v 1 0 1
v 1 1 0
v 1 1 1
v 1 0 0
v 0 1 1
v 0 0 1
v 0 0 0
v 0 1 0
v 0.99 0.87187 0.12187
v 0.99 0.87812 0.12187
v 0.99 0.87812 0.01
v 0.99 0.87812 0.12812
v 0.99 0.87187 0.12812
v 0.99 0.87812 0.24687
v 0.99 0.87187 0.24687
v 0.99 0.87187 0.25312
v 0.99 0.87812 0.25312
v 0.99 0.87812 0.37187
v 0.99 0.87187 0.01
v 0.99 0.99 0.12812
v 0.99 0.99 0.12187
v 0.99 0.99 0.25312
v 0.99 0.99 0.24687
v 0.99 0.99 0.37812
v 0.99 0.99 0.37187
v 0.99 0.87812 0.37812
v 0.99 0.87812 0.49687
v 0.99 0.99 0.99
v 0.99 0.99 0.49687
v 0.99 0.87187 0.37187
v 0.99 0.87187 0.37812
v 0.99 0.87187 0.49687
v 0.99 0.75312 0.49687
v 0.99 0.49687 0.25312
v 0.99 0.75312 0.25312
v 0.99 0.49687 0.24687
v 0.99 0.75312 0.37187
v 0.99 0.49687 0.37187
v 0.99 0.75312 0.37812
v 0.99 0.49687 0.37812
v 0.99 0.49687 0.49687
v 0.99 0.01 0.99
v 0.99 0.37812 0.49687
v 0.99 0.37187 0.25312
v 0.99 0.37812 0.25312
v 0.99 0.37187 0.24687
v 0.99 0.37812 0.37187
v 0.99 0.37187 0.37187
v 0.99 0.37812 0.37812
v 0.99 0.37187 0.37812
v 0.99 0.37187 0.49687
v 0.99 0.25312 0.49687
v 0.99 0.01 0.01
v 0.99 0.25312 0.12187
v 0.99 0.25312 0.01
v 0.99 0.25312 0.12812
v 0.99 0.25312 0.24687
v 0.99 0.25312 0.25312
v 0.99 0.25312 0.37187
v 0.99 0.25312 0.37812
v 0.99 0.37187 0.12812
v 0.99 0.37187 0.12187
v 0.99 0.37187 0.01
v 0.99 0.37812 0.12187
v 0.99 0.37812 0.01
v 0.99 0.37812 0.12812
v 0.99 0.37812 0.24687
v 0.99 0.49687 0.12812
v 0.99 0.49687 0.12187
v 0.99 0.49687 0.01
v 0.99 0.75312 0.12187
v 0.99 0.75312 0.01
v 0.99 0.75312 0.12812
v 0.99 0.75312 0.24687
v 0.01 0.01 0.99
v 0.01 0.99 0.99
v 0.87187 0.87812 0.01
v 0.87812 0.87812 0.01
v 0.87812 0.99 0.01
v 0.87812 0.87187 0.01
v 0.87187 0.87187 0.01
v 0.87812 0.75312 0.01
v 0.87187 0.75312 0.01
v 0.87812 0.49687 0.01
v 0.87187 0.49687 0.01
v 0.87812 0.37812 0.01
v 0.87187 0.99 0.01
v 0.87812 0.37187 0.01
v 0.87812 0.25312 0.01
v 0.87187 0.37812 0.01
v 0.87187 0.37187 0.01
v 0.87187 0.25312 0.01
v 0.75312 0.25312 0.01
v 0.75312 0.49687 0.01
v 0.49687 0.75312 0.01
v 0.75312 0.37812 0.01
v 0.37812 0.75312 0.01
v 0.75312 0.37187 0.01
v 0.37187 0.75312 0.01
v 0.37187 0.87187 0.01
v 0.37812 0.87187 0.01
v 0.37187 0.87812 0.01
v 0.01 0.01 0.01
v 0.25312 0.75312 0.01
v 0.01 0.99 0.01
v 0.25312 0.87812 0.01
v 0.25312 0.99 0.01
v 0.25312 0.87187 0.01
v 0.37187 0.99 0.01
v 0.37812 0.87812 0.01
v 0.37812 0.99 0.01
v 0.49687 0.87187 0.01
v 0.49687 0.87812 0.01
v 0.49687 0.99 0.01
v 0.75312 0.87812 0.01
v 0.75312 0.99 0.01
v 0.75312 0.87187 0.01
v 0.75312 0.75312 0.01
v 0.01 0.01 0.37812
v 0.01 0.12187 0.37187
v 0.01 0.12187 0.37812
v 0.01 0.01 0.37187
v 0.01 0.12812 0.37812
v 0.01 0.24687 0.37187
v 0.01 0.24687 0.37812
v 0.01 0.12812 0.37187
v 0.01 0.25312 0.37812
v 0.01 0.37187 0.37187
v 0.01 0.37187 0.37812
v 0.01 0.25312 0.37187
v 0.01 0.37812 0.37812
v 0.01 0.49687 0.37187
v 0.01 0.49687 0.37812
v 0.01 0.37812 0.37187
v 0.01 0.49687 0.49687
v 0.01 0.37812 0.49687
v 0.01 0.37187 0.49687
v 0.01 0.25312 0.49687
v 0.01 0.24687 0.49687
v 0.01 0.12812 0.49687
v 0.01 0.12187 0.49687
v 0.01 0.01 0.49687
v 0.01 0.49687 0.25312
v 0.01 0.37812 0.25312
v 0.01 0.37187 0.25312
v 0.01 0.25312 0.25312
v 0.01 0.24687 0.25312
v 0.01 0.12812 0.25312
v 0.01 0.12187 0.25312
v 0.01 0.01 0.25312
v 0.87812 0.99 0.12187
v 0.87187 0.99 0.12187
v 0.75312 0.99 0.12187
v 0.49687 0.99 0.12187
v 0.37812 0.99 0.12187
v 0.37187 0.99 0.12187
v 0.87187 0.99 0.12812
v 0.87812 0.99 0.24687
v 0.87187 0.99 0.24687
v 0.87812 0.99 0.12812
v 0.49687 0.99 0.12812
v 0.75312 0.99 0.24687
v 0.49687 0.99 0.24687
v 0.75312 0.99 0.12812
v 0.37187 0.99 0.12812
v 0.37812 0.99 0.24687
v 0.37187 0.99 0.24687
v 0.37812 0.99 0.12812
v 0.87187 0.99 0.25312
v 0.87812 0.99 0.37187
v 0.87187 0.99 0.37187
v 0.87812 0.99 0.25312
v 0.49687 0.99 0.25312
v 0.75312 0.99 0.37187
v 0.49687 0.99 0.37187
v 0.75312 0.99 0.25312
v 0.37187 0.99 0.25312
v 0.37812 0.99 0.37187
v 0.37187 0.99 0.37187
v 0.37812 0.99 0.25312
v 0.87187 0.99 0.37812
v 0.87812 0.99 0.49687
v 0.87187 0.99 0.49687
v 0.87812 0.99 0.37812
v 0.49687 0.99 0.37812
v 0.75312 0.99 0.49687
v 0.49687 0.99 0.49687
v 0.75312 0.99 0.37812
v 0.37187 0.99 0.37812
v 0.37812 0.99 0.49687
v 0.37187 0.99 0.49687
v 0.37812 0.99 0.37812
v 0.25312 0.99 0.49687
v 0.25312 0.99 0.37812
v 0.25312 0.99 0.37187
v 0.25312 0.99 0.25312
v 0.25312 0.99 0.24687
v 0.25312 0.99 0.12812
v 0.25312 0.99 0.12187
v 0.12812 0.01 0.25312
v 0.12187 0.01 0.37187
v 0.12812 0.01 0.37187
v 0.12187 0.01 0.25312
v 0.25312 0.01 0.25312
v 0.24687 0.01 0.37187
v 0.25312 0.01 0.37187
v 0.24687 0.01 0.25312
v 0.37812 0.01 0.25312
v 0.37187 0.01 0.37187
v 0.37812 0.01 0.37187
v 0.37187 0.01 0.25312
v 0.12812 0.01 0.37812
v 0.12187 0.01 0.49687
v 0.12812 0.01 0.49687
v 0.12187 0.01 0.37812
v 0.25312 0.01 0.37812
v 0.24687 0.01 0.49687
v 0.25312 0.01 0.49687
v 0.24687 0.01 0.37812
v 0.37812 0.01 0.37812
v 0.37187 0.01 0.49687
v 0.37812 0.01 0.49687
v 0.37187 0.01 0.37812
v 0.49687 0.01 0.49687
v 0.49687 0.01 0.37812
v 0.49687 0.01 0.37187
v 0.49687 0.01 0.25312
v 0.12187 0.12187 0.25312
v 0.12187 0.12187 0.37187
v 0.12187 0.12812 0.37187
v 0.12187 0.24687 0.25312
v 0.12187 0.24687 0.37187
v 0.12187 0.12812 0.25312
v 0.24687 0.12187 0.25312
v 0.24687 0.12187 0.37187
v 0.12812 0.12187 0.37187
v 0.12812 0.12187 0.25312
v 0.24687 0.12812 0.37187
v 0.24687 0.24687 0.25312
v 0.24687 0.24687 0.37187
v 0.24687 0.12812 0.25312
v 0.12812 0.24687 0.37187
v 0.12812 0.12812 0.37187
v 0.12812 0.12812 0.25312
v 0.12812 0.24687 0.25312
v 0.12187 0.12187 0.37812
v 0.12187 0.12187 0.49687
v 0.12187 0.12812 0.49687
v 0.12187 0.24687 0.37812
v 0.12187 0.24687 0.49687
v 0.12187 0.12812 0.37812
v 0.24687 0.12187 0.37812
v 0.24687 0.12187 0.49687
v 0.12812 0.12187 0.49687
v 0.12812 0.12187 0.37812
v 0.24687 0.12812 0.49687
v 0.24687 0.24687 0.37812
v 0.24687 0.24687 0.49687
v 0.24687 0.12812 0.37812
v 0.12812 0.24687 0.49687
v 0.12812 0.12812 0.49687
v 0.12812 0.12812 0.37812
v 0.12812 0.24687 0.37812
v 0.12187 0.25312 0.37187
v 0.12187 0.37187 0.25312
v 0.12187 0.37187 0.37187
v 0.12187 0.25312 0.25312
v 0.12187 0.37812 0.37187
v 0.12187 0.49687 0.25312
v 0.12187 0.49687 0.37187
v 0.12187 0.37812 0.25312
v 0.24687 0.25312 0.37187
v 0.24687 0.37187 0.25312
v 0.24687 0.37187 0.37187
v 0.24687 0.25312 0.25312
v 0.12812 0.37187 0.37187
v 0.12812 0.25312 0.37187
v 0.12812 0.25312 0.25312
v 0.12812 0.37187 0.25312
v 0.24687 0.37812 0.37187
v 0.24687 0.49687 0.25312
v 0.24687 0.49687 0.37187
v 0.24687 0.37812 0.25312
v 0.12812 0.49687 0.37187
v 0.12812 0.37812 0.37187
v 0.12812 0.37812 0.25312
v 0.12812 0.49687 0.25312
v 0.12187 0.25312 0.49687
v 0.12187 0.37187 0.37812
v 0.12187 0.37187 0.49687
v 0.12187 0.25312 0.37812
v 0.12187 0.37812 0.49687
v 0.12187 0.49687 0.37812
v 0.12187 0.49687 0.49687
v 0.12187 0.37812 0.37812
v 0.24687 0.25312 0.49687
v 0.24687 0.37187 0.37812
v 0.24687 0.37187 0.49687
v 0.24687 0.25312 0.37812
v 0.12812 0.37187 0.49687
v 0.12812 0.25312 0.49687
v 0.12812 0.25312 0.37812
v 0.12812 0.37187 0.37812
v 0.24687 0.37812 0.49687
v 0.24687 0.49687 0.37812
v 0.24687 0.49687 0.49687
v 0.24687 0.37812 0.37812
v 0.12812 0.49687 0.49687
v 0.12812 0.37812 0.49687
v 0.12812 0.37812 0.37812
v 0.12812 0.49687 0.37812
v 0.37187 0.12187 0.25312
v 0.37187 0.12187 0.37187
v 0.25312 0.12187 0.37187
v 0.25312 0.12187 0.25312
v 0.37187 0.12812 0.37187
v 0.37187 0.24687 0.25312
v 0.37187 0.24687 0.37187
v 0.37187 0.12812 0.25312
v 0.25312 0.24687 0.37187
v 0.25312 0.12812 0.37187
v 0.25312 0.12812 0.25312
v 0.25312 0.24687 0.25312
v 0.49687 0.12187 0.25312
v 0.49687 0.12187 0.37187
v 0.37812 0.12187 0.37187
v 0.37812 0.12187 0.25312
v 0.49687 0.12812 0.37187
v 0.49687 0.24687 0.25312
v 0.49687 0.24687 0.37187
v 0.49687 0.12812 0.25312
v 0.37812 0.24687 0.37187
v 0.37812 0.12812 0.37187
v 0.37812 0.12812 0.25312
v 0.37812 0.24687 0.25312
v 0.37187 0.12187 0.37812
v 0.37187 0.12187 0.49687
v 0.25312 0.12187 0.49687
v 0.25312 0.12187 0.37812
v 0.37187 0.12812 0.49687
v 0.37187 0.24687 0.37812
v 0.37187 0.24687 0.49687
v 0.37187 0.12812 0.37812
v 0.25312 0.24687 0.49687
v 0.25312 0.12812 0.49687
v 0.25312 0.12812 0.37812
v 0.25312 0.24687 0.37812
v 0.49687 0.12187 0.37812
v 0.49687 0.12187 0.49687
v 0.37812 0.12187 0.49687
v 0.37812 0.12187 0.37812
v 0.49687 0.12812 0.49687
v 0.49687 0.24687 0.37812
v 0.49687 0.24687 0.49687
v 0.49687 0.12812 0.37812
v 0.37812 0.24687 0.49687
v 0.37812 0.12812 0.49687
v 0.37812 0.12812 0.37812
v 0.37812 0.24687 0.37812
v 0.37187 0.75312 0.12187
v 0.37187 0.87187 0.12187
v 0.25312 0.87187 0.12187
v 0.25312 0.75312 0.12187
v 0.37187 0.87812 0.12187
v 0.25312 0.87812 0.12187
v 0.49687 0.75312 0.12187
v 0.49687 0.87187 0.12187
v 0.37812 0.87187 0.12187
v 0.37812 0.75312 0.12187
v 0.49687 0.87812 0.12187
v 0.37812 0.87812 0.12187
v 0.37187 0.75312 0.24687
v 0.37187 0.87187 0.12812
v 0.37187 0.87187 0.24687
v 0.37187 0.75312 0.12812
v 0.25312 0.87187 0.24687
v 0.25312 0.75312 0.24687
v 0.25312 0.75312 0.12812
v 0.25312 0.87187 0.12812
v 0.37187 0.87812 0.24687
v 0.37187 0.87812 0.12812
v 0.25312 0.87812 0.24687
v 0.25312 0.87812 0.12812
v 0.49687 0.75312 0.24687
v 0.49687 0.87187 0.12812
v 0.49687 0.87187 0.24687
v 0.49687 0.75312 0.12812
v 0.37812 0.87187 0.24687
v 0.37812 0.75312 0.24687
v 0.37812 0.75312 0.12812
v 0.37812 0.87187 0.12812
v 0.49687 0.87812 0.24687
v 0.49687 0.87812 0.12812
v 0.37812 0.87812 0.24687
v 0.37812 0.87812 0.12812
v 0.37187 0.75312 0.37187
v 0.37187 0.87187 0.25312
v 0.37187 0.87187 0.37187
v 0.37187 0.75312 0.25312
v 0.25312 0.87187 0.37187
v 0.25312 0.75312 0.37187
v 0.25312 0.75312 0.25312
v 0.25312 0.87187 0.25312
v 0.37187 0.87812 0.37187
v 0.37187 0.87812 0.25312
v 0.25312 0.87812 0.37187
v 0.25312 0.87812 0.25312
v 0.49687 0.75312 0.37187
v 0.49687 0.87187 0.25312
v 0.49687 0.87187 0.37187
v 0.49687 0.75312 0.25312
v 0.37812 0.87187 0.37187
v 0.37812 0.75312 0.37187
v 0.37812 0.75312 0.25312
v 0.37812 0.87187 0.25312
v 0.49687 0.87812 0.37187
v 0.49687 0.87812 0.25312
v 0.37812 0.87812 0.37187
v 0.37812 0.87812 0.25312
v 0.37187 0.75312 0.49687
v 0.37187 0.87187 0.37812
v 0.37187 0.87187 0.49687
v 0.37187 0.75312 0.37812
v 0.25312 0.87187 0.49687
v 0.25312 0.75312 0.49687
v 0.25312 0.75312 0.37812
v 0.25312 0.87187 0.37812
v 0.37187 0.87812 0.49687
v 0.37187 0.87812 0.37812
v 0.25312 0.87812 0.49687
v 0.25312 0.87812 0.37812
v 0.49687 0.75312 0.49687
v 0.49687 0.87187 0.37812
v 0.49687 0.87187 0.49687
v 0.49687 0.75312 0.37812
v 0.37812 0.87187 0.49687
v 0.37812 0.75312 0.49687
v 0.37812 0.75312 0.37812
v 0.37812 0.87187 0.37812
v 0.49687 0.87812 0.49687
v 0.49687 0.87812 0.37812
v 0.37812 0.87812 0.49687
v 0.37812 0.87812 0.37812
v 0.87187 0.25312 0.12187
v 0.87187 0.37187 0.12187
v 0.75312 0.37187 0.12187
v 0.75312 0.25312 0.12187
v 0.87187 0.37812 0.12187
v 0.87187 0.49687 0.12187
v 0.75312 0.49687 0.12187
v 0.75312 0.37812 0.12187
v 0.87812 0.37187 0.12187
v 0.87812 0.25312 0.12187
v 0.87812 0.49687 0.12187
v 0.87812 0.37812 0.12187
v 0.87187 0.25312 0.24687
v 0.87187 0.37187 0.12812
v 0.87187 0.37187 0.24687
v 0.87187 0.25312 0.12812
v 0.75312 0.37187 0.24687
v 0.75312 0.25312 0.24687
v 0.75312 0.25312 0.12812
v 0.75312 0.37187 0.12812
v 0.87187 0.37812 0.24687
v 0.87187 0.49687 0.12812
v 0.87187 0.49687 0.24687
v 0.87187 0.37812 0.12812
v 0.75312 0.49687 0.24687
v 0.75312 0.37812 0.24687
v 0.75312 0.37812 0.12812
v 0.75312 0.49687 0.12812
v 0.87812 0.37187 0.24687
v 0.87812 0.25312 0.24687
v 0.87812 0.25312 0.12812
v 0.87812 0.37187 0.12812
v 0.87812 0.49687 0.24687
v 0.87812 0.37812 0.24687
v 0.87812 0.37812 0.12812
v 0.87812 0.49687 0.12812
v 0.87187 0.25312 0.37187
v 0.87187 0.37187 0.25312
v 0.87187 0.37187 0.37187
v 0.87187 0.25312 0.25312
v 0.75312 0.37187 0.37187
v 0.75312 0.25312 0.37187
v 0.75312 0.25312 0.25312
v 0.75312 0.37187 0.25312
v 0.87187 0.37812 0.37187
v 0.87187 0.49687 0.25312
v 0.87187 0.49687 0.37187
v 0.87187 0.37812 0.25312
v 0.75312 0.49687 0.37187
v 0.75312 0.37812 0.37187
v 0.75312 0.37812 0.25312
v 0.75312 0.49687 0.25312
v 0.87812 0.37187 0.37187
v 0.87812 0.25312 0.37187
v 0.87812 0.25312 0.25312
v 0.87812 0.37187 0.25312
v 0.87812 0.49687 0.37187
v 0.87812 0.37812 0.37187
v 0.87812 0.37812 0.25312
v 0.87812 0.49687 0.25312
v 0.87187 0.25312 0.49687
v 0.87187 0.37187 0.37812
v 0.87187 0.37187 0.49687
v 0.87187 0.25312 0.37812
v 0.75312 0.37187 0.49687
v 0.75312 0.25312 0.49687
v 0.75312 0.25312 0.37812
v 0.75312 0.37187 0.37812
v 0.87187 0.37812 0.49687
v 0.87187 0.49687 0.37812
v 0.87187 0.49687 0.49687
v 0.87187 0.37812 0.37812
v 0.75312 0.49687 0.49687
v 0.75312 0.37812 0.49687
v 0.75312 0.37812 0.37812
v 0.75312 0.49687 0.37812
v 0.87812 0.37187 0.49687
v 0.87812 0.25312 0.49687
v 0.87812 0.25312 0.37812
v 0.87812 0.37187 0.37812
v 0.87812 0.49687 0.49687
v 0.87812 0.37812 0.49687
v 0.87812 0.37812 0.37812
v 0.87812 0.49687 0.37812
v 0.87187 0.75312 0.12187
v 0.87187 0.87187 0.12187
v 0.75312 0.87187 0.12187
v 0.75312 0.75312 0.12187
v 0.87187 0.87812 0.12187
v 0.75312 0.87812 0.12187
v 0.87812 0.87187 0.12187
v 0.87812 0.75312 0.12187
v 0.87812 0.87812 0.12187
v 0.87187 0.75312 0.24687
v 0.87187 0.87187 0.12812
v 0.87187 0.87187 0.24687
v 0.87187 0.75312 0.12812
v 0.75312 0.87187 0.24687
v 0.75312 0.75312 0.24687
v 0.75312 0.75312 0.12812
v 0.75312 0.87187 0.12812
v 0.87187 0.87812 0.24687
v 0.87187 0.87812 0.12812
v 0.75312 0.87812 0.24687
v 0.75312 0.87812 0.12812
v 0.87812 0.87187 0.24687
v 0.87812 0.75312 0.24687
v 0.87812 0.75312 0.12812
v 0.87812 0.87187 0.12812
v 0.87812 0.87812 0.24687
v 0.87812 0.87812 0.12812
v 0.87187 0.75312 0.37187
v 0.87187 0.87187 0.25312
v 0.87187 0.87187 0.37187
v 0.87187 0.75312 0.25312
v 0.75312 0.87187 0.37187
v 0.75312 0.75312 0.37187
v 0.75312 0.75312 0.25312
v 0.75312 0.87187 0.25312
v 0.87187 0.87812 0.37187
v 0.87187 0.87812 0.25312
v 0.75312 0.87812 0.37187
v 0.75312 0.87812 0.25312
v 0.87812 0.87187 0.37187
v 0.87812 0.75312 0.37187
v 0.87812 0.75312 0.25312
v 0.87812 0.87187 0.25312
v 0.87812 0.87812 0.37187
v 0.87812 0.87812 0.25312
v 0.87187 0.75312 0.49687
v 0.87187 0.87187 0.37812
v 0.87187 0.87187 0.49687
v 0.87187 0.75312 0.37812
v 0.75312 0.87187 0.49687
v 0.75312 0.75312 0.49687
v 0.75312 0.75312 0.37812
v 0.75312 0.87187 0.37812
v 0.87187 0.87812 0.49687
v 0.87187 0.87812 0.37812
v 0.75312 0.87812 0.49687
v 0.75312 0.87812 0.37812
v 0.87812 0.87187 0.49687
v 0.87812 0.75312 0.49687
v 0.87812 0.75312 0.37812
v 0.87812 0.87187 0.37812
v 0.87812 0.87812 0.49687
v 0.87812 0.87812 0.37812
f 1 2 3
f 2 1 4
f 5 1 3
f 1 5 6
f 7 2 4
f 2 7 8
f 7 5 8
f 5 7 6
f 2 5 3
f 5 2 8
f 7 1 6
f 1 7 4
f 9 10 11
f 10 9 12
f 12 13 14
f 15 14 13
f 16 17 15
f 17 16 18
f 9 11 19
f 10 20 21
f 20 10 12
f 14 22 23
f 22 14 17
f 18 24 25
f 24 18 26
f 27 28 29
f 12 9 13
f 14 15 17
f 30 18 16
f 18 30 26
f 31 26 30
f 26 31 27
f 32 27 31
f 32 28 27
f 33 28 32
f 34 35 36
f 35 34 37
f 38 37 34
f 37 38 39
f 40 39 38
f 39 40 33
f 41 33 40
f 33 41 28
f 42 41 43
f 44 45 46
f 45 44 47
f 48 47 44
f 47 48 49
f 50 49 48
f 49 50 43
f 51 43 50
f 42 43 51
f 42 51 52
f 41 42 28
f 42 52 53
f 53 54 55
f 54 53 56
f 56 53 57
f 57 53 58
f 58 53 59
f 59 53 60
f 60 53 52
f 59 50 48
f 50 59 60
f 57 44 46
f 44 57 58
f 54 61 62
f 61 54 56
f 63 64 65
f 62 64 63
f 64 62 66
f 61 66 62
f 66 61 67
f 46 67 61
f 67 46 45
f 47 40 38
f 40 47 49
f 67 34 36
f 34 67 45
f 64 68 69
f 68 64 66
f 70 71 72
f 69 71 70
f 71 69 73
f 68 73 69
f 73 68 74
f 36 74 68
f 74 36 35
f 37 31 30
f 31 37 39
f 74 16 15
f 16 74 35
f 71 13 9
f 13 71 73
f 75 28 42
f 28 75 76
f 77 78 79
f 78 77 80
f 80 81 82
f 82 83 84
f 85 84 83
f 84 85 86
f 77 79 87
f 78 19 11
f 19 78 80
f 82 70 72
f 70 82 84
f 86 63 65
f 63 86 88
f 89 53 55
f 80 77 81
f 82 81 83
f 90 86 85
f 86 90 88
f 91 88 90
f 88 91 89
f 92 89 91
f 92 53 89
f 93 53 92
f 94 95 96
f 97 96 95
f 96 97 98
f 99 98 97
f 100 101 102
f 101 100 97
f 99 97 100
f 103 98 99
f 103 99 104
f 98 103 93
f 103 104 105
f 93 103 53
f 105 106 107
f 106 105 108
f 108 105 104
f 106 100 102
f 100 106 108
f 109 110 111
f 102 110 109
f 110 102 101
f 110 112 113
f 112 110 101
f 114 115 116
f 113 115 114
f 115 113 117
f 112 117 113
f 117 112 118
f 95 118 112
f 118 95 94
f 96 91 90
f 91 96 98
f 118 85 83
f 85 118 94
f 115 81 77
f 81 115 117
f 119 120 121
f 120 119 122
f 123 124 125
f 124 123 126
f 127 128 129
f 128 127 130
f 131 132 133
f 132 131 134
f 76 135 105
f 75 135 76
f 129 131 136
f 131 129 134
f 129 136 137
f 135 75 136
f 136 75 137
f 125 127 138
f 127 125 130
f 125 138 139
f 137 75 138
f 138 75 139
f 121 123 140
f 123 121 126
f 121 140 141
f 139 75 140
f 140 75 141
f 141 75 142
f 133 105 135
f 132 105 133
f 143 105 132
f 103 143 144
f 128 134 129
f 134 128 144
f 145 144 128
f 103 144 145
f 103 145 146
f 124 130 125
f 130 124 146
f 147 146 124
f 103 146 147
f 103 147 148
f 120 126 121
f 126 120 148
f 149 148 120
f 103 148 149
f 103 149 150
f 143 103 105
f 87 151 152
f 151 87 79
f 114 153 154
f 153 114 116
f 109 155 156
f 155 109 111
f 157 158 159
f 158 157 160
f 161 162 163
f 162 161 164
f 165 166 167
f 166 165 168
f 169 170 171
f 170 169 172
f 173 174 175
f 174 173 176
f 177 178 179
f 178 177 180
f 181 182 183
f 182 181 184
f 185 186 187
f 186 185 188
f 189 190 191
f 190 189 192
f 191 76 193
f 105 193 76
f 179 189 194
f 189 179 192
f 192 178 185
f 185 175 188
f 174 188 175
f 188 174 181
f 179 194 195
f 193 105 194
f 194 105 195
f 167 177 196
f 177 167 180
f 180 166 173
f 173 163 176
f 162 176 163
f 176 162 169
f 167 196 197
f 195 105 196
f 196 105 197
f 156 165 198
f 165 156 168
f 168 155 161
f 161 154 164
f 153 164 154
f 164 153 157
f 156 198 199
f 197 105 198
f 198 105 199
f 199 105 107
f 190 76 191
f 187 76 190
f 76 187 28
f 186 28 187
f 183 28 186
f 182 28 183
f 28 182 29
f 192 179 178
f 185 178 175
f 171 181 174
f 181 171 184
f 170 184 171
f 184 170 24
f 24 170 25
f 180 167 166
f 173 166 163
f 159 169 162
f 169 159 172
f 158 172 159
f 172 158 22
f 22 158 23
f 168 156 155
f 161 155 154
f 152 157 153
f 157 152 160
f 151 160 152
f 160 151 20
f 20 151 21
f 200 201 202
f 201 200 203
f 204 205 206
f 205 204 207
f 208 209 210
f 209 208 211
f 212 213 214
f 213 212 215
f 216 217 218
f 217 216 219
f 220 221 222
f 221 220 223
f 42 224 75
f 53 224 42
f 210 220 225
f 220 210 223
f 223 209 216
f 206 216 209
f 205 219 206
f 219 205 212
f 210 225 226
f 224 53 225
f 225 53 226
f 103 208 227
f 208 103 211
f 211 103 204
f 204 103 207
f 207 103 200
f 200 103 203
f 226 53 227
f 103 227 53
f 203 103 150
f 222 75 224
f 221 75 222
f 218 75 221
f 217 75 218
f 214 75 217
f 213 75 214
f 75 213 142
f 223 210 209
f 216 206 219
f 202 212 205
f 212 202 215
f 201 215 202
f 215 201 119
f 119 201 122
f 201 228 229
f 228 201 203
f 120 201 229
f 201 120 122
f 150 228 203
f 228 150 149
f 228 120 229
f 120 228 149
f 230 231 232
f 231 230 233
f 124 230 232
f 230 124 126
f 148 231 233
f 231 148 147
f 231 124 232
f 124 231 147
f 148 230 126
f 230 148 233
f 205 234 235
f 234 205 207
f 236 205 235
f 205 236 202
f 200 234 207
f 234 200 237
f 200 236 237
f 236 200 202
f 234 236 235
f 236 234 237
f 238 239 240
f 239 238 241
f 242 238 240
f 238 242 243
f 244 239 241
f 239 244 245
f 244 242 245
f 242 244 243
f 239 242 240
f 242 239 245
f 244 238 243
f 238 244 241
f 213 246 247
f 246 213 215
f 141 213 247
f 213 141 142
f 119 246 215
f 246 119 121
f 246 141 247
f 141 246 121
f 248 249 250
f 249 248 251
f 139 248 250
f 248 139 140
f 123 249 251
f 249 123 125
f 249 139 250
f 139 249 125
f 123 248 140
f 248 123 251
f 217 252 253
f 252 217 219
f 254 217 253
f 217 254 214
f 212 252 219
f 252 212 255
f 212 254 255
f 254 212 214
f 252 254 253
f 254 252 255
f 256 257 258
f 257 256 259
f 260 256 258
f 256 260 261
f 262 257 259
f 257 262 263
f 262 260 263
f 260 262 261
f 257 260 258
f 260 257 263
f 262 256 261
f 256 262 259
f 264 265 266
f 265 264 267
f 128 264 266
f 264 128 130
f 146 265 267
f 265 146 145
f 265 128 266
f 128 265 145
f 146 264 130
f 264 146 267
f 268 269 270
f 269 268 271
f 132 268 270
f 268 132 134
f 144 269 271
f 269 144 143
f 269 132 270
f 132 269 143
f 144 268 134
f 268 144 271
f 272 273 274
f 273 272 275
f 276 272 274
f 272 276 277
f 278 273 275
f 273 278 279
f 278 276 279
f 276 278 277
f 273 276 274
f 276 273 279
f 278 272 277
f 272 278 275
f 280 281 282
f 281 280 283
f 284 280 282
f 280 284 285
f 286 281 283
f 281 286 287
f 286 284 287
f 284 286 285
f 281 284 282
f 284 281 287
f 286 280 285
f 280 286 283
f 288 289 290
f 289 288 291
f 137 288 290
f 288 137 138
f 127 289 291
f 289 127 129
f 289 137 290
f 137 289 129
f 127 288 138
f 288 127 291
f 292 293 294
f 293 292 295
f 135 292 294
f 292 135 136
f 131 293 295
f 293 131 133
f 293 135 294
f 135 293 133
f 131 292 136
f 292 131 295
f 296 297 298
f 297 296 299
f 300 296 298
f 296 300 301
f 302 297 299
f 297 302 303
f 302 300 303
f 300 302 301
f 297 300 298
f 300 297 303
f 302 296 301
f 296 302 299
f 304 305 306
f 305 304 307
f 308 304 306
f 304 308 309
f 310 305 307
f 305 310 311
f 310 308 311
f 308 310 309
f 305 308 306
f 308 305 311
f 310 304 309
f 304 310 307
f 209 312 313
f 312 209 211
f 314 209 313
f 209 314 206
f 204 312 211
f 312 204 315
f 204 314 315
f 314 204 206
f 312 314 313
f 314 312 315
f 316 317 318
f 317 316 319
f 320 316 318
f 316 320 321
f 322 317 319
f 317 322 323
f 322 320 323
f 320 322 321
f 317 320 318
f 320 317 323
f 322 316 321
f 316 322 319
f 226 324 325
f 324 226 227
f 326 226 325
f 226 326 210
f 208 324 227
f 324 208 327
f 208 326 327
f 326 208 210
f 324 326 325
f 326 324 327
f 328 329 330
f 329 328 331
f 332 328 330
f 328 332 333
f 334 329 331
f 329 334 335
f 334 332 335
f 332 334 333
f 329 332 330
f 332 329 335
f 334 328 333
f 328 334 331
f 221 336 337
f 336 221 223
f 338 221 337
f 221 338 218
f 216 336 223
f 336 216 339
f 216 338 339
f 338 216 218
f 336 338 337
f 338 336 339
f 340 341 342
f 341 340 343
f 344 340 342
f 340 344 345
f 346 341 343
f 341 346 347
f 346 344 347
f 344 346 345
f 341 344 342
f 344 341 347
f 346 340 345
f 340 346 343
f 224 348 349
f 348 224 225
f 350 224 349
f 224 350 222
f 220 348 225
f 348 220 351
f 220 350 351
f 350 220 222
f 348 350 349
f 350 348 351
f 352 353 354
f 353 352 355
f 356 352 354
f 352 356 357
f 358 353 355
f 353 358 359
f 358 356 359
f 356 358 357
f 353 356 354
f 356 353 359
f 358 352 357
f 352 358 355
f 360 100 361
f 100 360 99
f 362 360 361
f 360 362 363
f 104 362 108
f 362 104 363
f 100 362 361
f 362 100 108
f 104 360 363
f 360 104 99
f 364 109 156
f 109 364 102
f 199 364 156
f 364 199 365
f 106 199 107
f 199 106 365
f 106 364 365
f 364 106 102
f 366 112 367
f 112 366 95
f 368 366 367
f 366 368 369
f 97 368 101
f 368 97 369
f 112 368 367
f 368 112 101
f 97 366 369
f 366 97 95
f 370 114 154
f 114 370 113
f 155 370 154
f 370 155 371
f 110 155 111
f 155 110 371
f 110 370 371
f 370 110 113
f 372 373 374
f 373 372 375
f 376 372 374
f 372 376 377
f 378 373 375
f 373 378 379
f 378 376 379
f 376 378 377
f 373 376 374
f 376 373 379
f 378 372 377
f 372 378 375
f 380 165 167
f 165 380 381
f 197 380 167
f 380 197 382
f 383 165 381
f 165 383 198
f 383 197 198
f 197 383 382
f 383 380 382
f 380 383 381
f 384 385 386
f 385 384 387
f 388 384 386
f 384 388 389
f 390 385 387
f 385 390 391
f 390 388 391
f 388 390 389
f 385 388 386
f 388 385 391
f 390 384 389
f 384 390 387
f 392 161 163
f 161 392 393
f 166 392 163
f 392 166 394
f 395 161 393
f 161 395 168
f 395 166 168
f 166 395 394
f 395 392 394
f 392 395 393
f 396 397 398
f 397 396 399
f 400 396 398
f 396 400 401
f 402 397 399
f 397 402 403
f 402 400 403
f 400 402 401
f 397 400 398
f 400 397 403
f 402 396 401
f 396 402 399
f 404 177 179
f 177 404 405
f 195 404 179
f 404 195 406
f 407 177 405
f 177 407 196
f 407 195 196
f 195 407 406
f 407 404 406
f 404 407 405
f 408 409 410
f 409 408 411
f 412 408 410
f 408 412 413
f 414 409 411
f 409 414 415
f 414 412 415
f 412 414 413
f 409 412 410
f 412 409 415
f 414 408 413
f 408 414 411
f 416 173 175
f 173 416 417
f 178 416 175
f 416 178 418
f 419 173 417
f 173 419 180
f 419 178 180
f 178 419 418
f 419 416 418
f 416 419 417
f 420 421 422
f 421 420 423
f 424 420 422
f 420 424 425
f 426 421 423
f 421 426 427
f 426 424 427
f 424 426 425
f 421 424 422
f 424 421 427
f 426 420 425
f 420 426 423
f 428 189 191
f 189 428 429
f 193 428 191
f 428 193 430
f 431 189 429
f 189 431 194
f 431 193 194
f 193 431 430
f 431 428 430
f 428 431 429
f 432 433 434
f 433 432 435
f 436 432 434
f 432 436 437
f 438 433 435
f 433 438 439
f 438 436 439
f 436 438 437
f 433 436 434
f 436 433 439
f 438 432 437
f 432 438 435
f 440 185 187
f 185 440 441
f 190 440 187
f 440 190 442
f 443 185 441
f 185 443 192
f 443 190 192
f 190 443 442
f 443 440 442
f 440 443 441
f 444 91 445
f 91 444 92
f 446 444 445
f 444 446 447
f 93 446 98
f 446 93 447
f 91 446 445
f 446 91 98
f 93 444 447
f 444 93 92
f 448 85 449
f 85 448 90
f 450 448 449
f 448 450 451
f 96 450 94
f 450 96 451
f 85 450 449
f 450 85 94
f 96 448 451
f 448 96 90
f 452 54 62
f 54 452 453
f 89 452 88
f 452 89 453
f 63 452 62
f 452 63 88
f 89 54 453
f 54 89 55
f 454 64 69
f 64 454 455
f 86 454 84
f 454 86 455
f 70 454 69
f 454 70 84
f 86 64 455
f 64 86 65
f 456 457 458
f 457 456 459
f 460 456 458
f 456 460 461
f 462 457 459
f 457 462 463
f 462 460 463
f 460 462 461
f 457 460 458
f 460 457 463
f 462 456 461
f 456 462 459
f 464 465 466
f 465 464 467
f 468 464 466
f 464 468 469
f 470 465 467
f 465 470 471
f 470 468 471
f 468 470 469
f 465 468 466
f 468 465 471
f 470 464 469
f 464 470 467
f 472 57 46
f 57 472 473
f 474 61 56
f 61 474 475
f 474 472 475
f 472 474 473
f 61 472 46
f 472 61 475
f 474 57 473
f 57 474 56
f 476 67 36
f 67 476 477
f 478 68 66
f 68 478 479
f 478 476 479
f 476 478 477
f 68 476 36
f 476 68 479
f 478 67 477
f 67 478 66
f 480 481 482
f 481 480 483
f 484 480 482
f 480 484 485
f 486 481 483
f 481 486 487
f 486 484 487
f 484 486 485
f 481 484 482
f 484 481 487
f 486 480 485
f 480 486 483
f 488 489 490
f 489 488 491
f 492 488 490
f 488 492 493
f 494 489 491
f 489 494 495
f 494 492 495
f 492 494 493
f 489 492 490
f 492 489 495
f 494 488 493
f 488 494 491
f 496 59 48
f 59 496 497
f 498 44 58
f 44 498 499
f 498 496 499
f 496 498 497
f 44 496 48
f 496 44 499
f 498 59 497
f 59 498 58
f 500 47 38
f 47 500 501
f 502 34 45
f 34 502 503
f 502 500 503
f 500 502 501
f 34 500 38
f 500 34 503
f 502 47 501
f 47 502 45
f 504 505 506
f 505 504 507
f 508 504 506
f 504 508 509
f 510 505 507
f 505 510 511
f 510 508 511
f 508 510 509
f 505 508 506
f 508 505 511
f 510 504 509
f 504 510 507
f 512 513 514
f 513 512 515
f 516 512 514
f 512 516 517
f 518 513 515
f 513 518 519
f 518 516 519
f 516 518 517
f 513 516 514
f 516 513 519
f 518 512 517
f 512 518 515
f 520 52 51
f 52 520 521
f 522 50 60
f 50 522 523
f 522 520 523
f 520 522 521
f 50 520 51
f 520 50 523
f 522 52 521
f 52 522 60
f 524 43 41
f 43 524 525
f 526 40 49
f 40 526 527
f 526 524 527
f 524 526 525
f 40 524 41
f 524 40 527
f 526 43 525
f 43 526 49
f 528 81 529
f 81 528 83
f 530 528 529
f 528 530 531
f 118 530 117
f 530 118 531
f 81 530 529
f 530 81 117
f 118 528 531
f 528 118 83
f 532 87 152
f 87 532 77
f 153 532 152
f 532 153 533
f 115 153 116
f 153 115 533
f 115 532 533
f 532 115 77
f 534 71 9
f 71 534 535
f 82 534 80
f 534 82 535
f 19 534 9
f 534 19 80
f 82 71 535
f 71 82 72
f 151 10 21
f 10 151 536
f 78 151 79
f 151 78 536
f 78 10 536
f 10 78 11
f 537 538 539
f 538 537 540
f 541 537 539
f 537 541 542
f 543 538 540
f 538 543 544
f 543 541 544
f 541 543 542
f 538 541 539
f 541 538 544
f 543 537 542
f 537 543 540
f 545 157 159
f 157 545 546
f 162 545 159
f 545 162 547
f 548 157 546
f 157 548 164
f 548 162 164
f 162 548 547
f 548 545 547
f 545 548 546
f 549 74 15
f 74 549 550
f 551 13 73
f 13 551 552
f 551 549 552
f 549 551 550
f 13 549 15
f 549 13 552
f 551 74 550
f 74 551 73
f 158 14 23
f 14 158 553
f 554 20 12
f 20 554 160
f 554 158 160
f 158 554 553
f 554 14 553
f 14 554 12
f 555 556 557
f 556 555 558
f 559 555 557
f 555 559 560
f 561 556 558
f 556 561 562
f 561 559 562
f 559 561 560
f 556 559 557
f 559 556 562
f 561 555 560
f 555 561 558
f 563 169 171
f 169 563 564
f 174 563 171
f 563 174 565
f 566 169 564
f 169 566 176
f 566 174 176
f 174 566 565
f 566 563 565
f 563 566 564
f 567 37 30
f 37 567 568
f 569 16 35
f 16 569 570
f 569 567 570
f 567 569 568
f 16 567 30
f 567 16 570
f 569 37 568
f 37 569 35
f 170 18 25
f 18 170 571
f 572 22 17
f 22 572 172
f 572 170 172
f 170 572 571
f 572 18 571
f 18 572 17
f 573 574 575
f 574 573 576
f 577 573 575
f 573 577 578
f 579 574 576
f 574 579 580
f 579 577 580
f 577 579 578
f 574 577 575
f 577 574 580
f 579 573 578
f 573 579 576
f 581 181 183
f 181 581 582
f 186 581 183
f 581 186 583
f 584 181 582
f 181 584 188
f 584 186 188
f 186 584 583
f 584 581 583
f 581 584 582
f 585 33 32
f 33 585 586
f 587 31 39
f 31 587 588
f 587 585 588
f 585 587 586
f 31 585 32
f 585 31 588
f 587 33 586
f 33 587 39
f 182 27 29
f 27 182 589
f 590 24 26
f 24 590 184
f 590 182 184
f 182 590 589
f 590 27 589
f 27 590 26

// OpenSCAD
translate([0.0625, 0.0625, 0.3125]) color([0.5841695812453656, 0.1964595669637591, 0.008074763612493485]) cube([0.11875, 0.11875, 0.11875], center=true);
translate([0.0625, 0.1875, 0.3125]) color([0.9494793193265006, 0.6241348693018607, 0.9875713538124239]) cube([0.11875, 0.11875, 0.11875], center=true);
translate([0.1875, 0.0625, 0.3125]) color([0.25082286371009, 0.8914996330245484, 0.1488376514269667]) cube([0.11875, 0.11875, 0.11875], center=true);
translate([0.1875, 0.1875, 0.3125]) color([0.27174126702940415, 0.7780062180869719, 0.10840893732786527]) cube([0.11875, 0.11875, 0.11875], center=true);
translate([0.0625, 0.0625, 0.4375]) color([0.492935634178017, 0.9925025742459079, 0.4763742033349181]) cube([0.11875, 0.11875, 0.11875], center=true);
translate([0.0625, 0.1875, 0.4375]) color([0.5645353940464544, 0.5645149416671972, 0.5782095790017063]) cube([0.11875, 0.11875, 0.11875], center=true);
translate([0.1875, 0.0625, 0.4375]) color([0.6259208181141003, 0.3183347846489948, 0.008894474561215282]) cube([0.11875, 0.11875, 0.11875], center=true);
translate([0.1875, 0.1875, 0.4375]) color([0.18153781425127913, 0.34637837294987994, 0.4332209949859577]) cube([0.11875, 0.11875, 0.11875], center=true);
translate([0.0625, 0.3125, 0.3125]) color([0.622677078771968, 0.460137332113394, 0.7269997238917864]) cube([0.11875, 0.11875, 0.11875], center=true);
translate([0.0625, 0.4375, 0.3125]) color([0.4327048094315018, 0.22311727903273915, 0.1897727920191702]) cube([0.11875, 0.11875, 0.11875], center=true);
translate([0.1875, 0.3125, 0.3125]) color([0.3552161035541822, 0.8963480118349955, 0.8220560222783454]) cube([0.11875, 0.11875, 0.11875], center=true);
translate([0.1875, 0.4375, 0.3125]) color([0.669948185257765, 0.358889329750682, 0.7679542096123538]) cube([0.11875, 0.11875, 0.11875], center=true);
translate([0.0625, 0.3125, 0.4375]) color([0.8826141592721374, 0.17940760591248683, 0.3538262276809083]) cube([0.11875, 0.11875, 0.11875], center=true);
translate([0.0625, 0.4375, 0.4375]) color([0.7932719249905827, 0.4788790393271024, 0.07989050421154975]) cube([0.11875, 0.11875, 0.11875], center=true);
translate([0.1875, 0.3125, 0.4375]) color([0.2300352112368863, 0.6572505439496785, 0.05068332689649402]) cube([0.11875, 0.11875, 0.11875], center=true);
translate([0.1875, 0.4375, 0.4375]) color([0.7936196601725969, 0.404241923497329, 0.462328648221512]) cube([0.11875, 0.11875, 0.11875], center=true);
translate([0.3125, 0.0625, 0.3125]) color([0.31878762038885544, 0.8255572067625851, 0.2007024141421666]) cube([0.11875, 0.11875, 0.11875], center=true);
translate([0.3125, 0.1875, 0.3125]) color([0.15132678193974147, 0.024979494971208438, 0.7729677973813559]) cube([0.11875, 0.11875, 0.11875], center=true);
translate([0.4375, 0.0625, 0.3125]) color([0.7722304331836956, 0.30532980306575985, 0.9493109840811514]) cube([0.11875, 0.11875, 0.11875], center=true);
translate([0.4375, 0.1875, 0.3125]) color([0.03532969454668722, 0.7465045555676156, 0.24592106518099655]) cube([0.11875, 0.11875, 0.11875], center=true);
translate([0.3125, 0.0625, 0.4375]) color([0.8991758354896038, 0.39552542168416527, 0.984654660668697]) cube([0.11875, 0.11875, 0.11875], center=true);
translate([0.3125, 0.1875, 0.4375]) color([0.608251397905789, 0.12712748175104782, 0.08747171410699894]) cube([0.11875, 0.11875, 0.11875], center=true);
translate([0.4375, 0.0625, 0.4375]) color([0.3808033765783264, 0.9240222660208113, 0.6648335234074098]) cube([0.11875, 0.11875, 0.11875], center=true);
translate([0.4375, 0.1875, 0.4375]) color([0.7060281207150522, 0.234661547137744, 0.7197367316041385]) cube([0.11875, 0.11875, 0.11875], center=true);
translate([0.3125, 0.8125, 0.0625]) color([0.4285424088939368, 0.29023292885267815, 0.7078102407181187]) cube([0.11875, 0.11875, 0.11875], center=true);
translate([0.3125, 0.9375, 0.0625]) color([0.5632558203134793, 0.3138573790894954, 0.7052161309992366]) cube([0.11875, 0.11875, 0.11875], center=true);
translate([0.4375, 0.8125, 0.0625]) color([0.32091493446133057, 0.293831403284706, 0.3731581655903512]) cube([0.11875, 0.11875, 0.11875], center=true);
translate([0.4375, 0.9375, 0.0625]) color([0.5782490675510084, 0.9927079095395339, 0.6332250780204816]) cube([0.11875, 0.11875, 0.11875], center=true);
translate([0.3125, 0.8125, 0.1875]) color([0.9262292011877322, 0.19257347229843758, 0.4847635825634379]) cube([0.11875, 0.11875, 0.11875], center=true);
translate([0.3125, 0.9375, 0.1875]) color([0.32293102426480036, 0.5648580026802762, 0.859039434316357]) cube([0.11875, 0.11875, 0.11875], center=true);
translate([0.4375, 0.8125, 0.1875]) color([0.11450467107224227, 0.24654270916573473, 0.8022431497195334]) cube([0.11875, 0.11875, 0.11875], center=true);
translate([0.4375, 0.9375, 0.1875]) color([0.9974782652977877, 0.5622891778919303, 0.8856148225541055]) cube([0.11875, 0.11875, 0.11875], center=true);
translate([0.3125, 0.8125, 0.3125]) color([0.0017464625305061432, 0.6399397853695268, 0.915867298849852]) cube([0.11875, 0.11875, 0.11875], center=true);
translate([0.3125, 0.9375, 0.3125]) color([0.5855424315707215, 0.38937260419771846, 0.8394811889125335]) cube([0.11875, 0.11875, 0.11875], center=true);
translate([0.4375, 0.8125, 0.3125]) color([0.3215048835753035, 0.3677562078169012, 0.7494627671301212]) cube([0.11875, 0.11875, 0.11875], center=true);
translate([0.4375, 0.9375, 0.3125]) color([0.30184863277022156, 0.6628736677885209, 0.0632131705894865]) cube([0.11875, 0.11875, 0.11875], center=true);
translate([0.3125, 0.8125, 0.4375]) color([0.5243842101287214, 0.47165497896075304, 0.9213736994711477]) cube([0.11875, 0.11875, 0.11875], center=true);
translate([0.3125, 0.9375, 0.4375]) color([0.2655300292692059, 0.05877022229080964, 0.8936048465596106]) cube([0.11875, 0.11875, 0.11875], center=true);
translate([0.4375, 0.8125, 0.4375]) color([0.38385546117475144, 0.5823938546186237, 0.8293811547972308]) cube([0.11875, 0.11875, 0.11875], center=true);
translate([0.4375, 0.9375, 0.4375]) color([0.48542924275687616, 0.10381936707984529, 0.5930381713407349]) cube([0.11875, 0.11875, 0.11875], center=true);
translate([0.8125, 0.3125, 0.0625]) color([0.8734760232510536, 0.1915382263628701, 0.38556480032929374]) cube([0.11875, 0.11875, 0.11875], center=true);
translate([0.8125, 0.4375, 0.0625]) color([0.017673348579883674, 0.8123534260898997, 0.15172321274214484]) cube([0.11875, 0.11875, 0.11875], center=true);
translate([0.9375, 0.3125, 0.0625]) color([0.41808413487617535, 0.6347834890460891, 0.623457506697616]) cube([0.11875, 0.11875, 0.11875], center=true);
translate([0.9375, 0.4375, 0.0625]) color([0.4231115673306568, 0.39027312844199424, 0.5649760595410669]) cube([0.11875, 0.11875, 0.11875], center=true);
translate([0.8125, 0.3125, 0.1875]) color([0.0982189399494724, 0.9572726621716725, 0.8973692686249237]) cube([0.11875, 0.11875, 0.11875], center=true);
translate([0.8125, 0.4375, 0.1875]) color([0.9099750721833756, 0.7050256753002813, 0.20800674002854325]) cube([0.11875, 0.11875, 0.11875], center=true);
translate([0.9375, 0.3125, 0.1875]) color([0.4270338075409441, 0.6790759129131736, 0.3184839624218968]) cube([0.11875, 0.11875, 0.11875], center=true);
translate([0.9375, 0.4375, 0.1875]) color([0.18095987209633546, 0.24351206184075702, 0.040054664064950285]) cube([0.11875, 0.11875, 0.11875], center=true);
translate([0.8125, 0.3125, 0.3125]) color([0.0646333532707627, 0.7329738379257749, 0.26987096683235423]) cube([0.11875, 0.11875, 0.11875], center=true);
translate([0.8125, 0.4375, 0.3125]) color([0.07100295259613199, 0.9611592305695528, 0.6394624559031764]) cube([0.11875, 0.11875, 0.11875], center=true);
translate([0.9375, 0.3125, 0.3125]) color([0.43652005108557357, 0.37112903283499044, 0.512730465061678]) cube([0.11875, 0.11875, 0.11875], center=true);
translate([0.9375, 0.4375, 0.3125]) color([0.7930007051507592, 0.8107344339177703, 0.4134721342216193]) cube([0.11875, 0.11875, 0.11875], center=true);
translate([0.8125, 0.3125, 0.4375]) color([0.016203864593326123, 0.9626786391919302, 0.7637150938199417]) cube([0.11875, 0.11875, 0.11875], center=true);
translate([0.8125, 0.4375, 0.4375]) color([0.9075710898116474, 0.4958985321097541, 0.8930316197981101]) cube([0.11875, 0.11875, 0.11875], center=true);
translate([0.9375, 0.3125, 0.4375]) color([0.285238800222929, 0.9851933874164138, 0.30545615302993967]) cube([0.11875, 0.11875, 0.11875], center=true);
translate([0.9375, 0.4375, 0.4375]) color([0.9206070913246931, 0.2284543950614587, 0.7791737280704059]) cube([0.11875, 0.11875, 0.11875], center=true);
translate([0.8125, 0.8125, 0.0625]) color([0.5262747155802427, 0.5746765522171167, 0.9569097235129358]) cube([0.11875, 0.11875, 0.11875], center=true);
translate([0.8125, 0.9375, 0.0625]) color([0.9579584028984826, 0.4138320481025255, 0.9432699617865467]) cube([0.11875, 0.11875, 0.11875], center=true);
translate([0.9375, 0.8125, 0.0625]) color([0.3811268096386682, 0.6060706990627323, 0.20064663326062815]) cube([0.11875, 0.11875, 0.11875], center=true);
translate([0.9375, 0.9375, 0.0625]) color([0.8600625599568914, 0.4810804049151378, 0.04912355718810557]) cube([0.11875, 0.11875, 0.11875], center=true);
translate([0.8125, 0.8125, 0.1875]) color([0.726232825090069, 0.37025327386175, 0.7545381743048917]) cube([0.11875, 0.11875, 0.11875], center=true);
translate([0.8125, 0.9375, 0.1875]) color([0.6787881800632759, 0.295665427538119, 0.6499739228765143]) cube([0.11875, 0.11875, 0.11875], center=true);
translate([0.9375, 0.8125, 0.1875]) color([0.9137047260129859, 0.4505703825614218, 0.827365417200462]) cube([0.11875, 0.11875, 0.11875], center=true);
translate([0.9375, 0.9375, 0.1875]) color([0.9850209854873923, 0.43227342213209463, 0.3330322313930446]) cube([0.11875, 0.11875, 0.11875], center=true);
translate([0.8125, 0.8125, 0.3125]) color([0.3113034086022918, 0.23401754553807275, 0.4534903885336776]) cube([0.11875, 0.11875, 0.11875], center=true);
translate([0.8125, 0.9375, 0.3125]) color([0.6801624615278029, 0.11873917706348824, 0.19291982229923033]) cube([0.11875, 0.11875, 0.11875], center=true);
translate([0.9375, 0.8125, 0.3125]) color([0.09676550124949068, 0.5082053667720676, 0.2347953458073434]) cube([0.11875, 0.11875, 0.11875], center=true);
translate([0.9375, 0.9375, 0.3125]) color([0.6505618354377245, 0.15432219159071403, 0.4157178721571926]) cube([0.11875, 0.11875, 0.11875], center=true);
translate([0.8125, 0.8125, 0.4375]) color([0.9060321018863964, 0.46707471508067033, 0.9615100813126638]) cube([0.11875, 0.11875, 0.11875], center=true);
translate([0.8125, 0.9375, 0.4375]) color([0.06088916957997703, 0.7103796443938903, 0.3901218177992093]) cube([0.11875, 0.11875, 0.11875], center=true);
translate([0.9375, 0.8125, 0.4375]) color([0.31730654761591204, 0.4576178905438737, 0.719868483993183]) cube([0.11875, 0.11875, 0.11875], center=true);
translate([0.9375, 0.9375, 0.4375]) color([0.01409324375371146, 0.41425011764352837, 0.7726971980601061]) cube([0.11875, 0.11875, 0.11875], center=true);
color([0.3,0.3,0.3,0.3]) difference() { cube([1,1,1]); translate([0.01,0.01,0.01]) cube([0.98,0.98,0.98]); }
